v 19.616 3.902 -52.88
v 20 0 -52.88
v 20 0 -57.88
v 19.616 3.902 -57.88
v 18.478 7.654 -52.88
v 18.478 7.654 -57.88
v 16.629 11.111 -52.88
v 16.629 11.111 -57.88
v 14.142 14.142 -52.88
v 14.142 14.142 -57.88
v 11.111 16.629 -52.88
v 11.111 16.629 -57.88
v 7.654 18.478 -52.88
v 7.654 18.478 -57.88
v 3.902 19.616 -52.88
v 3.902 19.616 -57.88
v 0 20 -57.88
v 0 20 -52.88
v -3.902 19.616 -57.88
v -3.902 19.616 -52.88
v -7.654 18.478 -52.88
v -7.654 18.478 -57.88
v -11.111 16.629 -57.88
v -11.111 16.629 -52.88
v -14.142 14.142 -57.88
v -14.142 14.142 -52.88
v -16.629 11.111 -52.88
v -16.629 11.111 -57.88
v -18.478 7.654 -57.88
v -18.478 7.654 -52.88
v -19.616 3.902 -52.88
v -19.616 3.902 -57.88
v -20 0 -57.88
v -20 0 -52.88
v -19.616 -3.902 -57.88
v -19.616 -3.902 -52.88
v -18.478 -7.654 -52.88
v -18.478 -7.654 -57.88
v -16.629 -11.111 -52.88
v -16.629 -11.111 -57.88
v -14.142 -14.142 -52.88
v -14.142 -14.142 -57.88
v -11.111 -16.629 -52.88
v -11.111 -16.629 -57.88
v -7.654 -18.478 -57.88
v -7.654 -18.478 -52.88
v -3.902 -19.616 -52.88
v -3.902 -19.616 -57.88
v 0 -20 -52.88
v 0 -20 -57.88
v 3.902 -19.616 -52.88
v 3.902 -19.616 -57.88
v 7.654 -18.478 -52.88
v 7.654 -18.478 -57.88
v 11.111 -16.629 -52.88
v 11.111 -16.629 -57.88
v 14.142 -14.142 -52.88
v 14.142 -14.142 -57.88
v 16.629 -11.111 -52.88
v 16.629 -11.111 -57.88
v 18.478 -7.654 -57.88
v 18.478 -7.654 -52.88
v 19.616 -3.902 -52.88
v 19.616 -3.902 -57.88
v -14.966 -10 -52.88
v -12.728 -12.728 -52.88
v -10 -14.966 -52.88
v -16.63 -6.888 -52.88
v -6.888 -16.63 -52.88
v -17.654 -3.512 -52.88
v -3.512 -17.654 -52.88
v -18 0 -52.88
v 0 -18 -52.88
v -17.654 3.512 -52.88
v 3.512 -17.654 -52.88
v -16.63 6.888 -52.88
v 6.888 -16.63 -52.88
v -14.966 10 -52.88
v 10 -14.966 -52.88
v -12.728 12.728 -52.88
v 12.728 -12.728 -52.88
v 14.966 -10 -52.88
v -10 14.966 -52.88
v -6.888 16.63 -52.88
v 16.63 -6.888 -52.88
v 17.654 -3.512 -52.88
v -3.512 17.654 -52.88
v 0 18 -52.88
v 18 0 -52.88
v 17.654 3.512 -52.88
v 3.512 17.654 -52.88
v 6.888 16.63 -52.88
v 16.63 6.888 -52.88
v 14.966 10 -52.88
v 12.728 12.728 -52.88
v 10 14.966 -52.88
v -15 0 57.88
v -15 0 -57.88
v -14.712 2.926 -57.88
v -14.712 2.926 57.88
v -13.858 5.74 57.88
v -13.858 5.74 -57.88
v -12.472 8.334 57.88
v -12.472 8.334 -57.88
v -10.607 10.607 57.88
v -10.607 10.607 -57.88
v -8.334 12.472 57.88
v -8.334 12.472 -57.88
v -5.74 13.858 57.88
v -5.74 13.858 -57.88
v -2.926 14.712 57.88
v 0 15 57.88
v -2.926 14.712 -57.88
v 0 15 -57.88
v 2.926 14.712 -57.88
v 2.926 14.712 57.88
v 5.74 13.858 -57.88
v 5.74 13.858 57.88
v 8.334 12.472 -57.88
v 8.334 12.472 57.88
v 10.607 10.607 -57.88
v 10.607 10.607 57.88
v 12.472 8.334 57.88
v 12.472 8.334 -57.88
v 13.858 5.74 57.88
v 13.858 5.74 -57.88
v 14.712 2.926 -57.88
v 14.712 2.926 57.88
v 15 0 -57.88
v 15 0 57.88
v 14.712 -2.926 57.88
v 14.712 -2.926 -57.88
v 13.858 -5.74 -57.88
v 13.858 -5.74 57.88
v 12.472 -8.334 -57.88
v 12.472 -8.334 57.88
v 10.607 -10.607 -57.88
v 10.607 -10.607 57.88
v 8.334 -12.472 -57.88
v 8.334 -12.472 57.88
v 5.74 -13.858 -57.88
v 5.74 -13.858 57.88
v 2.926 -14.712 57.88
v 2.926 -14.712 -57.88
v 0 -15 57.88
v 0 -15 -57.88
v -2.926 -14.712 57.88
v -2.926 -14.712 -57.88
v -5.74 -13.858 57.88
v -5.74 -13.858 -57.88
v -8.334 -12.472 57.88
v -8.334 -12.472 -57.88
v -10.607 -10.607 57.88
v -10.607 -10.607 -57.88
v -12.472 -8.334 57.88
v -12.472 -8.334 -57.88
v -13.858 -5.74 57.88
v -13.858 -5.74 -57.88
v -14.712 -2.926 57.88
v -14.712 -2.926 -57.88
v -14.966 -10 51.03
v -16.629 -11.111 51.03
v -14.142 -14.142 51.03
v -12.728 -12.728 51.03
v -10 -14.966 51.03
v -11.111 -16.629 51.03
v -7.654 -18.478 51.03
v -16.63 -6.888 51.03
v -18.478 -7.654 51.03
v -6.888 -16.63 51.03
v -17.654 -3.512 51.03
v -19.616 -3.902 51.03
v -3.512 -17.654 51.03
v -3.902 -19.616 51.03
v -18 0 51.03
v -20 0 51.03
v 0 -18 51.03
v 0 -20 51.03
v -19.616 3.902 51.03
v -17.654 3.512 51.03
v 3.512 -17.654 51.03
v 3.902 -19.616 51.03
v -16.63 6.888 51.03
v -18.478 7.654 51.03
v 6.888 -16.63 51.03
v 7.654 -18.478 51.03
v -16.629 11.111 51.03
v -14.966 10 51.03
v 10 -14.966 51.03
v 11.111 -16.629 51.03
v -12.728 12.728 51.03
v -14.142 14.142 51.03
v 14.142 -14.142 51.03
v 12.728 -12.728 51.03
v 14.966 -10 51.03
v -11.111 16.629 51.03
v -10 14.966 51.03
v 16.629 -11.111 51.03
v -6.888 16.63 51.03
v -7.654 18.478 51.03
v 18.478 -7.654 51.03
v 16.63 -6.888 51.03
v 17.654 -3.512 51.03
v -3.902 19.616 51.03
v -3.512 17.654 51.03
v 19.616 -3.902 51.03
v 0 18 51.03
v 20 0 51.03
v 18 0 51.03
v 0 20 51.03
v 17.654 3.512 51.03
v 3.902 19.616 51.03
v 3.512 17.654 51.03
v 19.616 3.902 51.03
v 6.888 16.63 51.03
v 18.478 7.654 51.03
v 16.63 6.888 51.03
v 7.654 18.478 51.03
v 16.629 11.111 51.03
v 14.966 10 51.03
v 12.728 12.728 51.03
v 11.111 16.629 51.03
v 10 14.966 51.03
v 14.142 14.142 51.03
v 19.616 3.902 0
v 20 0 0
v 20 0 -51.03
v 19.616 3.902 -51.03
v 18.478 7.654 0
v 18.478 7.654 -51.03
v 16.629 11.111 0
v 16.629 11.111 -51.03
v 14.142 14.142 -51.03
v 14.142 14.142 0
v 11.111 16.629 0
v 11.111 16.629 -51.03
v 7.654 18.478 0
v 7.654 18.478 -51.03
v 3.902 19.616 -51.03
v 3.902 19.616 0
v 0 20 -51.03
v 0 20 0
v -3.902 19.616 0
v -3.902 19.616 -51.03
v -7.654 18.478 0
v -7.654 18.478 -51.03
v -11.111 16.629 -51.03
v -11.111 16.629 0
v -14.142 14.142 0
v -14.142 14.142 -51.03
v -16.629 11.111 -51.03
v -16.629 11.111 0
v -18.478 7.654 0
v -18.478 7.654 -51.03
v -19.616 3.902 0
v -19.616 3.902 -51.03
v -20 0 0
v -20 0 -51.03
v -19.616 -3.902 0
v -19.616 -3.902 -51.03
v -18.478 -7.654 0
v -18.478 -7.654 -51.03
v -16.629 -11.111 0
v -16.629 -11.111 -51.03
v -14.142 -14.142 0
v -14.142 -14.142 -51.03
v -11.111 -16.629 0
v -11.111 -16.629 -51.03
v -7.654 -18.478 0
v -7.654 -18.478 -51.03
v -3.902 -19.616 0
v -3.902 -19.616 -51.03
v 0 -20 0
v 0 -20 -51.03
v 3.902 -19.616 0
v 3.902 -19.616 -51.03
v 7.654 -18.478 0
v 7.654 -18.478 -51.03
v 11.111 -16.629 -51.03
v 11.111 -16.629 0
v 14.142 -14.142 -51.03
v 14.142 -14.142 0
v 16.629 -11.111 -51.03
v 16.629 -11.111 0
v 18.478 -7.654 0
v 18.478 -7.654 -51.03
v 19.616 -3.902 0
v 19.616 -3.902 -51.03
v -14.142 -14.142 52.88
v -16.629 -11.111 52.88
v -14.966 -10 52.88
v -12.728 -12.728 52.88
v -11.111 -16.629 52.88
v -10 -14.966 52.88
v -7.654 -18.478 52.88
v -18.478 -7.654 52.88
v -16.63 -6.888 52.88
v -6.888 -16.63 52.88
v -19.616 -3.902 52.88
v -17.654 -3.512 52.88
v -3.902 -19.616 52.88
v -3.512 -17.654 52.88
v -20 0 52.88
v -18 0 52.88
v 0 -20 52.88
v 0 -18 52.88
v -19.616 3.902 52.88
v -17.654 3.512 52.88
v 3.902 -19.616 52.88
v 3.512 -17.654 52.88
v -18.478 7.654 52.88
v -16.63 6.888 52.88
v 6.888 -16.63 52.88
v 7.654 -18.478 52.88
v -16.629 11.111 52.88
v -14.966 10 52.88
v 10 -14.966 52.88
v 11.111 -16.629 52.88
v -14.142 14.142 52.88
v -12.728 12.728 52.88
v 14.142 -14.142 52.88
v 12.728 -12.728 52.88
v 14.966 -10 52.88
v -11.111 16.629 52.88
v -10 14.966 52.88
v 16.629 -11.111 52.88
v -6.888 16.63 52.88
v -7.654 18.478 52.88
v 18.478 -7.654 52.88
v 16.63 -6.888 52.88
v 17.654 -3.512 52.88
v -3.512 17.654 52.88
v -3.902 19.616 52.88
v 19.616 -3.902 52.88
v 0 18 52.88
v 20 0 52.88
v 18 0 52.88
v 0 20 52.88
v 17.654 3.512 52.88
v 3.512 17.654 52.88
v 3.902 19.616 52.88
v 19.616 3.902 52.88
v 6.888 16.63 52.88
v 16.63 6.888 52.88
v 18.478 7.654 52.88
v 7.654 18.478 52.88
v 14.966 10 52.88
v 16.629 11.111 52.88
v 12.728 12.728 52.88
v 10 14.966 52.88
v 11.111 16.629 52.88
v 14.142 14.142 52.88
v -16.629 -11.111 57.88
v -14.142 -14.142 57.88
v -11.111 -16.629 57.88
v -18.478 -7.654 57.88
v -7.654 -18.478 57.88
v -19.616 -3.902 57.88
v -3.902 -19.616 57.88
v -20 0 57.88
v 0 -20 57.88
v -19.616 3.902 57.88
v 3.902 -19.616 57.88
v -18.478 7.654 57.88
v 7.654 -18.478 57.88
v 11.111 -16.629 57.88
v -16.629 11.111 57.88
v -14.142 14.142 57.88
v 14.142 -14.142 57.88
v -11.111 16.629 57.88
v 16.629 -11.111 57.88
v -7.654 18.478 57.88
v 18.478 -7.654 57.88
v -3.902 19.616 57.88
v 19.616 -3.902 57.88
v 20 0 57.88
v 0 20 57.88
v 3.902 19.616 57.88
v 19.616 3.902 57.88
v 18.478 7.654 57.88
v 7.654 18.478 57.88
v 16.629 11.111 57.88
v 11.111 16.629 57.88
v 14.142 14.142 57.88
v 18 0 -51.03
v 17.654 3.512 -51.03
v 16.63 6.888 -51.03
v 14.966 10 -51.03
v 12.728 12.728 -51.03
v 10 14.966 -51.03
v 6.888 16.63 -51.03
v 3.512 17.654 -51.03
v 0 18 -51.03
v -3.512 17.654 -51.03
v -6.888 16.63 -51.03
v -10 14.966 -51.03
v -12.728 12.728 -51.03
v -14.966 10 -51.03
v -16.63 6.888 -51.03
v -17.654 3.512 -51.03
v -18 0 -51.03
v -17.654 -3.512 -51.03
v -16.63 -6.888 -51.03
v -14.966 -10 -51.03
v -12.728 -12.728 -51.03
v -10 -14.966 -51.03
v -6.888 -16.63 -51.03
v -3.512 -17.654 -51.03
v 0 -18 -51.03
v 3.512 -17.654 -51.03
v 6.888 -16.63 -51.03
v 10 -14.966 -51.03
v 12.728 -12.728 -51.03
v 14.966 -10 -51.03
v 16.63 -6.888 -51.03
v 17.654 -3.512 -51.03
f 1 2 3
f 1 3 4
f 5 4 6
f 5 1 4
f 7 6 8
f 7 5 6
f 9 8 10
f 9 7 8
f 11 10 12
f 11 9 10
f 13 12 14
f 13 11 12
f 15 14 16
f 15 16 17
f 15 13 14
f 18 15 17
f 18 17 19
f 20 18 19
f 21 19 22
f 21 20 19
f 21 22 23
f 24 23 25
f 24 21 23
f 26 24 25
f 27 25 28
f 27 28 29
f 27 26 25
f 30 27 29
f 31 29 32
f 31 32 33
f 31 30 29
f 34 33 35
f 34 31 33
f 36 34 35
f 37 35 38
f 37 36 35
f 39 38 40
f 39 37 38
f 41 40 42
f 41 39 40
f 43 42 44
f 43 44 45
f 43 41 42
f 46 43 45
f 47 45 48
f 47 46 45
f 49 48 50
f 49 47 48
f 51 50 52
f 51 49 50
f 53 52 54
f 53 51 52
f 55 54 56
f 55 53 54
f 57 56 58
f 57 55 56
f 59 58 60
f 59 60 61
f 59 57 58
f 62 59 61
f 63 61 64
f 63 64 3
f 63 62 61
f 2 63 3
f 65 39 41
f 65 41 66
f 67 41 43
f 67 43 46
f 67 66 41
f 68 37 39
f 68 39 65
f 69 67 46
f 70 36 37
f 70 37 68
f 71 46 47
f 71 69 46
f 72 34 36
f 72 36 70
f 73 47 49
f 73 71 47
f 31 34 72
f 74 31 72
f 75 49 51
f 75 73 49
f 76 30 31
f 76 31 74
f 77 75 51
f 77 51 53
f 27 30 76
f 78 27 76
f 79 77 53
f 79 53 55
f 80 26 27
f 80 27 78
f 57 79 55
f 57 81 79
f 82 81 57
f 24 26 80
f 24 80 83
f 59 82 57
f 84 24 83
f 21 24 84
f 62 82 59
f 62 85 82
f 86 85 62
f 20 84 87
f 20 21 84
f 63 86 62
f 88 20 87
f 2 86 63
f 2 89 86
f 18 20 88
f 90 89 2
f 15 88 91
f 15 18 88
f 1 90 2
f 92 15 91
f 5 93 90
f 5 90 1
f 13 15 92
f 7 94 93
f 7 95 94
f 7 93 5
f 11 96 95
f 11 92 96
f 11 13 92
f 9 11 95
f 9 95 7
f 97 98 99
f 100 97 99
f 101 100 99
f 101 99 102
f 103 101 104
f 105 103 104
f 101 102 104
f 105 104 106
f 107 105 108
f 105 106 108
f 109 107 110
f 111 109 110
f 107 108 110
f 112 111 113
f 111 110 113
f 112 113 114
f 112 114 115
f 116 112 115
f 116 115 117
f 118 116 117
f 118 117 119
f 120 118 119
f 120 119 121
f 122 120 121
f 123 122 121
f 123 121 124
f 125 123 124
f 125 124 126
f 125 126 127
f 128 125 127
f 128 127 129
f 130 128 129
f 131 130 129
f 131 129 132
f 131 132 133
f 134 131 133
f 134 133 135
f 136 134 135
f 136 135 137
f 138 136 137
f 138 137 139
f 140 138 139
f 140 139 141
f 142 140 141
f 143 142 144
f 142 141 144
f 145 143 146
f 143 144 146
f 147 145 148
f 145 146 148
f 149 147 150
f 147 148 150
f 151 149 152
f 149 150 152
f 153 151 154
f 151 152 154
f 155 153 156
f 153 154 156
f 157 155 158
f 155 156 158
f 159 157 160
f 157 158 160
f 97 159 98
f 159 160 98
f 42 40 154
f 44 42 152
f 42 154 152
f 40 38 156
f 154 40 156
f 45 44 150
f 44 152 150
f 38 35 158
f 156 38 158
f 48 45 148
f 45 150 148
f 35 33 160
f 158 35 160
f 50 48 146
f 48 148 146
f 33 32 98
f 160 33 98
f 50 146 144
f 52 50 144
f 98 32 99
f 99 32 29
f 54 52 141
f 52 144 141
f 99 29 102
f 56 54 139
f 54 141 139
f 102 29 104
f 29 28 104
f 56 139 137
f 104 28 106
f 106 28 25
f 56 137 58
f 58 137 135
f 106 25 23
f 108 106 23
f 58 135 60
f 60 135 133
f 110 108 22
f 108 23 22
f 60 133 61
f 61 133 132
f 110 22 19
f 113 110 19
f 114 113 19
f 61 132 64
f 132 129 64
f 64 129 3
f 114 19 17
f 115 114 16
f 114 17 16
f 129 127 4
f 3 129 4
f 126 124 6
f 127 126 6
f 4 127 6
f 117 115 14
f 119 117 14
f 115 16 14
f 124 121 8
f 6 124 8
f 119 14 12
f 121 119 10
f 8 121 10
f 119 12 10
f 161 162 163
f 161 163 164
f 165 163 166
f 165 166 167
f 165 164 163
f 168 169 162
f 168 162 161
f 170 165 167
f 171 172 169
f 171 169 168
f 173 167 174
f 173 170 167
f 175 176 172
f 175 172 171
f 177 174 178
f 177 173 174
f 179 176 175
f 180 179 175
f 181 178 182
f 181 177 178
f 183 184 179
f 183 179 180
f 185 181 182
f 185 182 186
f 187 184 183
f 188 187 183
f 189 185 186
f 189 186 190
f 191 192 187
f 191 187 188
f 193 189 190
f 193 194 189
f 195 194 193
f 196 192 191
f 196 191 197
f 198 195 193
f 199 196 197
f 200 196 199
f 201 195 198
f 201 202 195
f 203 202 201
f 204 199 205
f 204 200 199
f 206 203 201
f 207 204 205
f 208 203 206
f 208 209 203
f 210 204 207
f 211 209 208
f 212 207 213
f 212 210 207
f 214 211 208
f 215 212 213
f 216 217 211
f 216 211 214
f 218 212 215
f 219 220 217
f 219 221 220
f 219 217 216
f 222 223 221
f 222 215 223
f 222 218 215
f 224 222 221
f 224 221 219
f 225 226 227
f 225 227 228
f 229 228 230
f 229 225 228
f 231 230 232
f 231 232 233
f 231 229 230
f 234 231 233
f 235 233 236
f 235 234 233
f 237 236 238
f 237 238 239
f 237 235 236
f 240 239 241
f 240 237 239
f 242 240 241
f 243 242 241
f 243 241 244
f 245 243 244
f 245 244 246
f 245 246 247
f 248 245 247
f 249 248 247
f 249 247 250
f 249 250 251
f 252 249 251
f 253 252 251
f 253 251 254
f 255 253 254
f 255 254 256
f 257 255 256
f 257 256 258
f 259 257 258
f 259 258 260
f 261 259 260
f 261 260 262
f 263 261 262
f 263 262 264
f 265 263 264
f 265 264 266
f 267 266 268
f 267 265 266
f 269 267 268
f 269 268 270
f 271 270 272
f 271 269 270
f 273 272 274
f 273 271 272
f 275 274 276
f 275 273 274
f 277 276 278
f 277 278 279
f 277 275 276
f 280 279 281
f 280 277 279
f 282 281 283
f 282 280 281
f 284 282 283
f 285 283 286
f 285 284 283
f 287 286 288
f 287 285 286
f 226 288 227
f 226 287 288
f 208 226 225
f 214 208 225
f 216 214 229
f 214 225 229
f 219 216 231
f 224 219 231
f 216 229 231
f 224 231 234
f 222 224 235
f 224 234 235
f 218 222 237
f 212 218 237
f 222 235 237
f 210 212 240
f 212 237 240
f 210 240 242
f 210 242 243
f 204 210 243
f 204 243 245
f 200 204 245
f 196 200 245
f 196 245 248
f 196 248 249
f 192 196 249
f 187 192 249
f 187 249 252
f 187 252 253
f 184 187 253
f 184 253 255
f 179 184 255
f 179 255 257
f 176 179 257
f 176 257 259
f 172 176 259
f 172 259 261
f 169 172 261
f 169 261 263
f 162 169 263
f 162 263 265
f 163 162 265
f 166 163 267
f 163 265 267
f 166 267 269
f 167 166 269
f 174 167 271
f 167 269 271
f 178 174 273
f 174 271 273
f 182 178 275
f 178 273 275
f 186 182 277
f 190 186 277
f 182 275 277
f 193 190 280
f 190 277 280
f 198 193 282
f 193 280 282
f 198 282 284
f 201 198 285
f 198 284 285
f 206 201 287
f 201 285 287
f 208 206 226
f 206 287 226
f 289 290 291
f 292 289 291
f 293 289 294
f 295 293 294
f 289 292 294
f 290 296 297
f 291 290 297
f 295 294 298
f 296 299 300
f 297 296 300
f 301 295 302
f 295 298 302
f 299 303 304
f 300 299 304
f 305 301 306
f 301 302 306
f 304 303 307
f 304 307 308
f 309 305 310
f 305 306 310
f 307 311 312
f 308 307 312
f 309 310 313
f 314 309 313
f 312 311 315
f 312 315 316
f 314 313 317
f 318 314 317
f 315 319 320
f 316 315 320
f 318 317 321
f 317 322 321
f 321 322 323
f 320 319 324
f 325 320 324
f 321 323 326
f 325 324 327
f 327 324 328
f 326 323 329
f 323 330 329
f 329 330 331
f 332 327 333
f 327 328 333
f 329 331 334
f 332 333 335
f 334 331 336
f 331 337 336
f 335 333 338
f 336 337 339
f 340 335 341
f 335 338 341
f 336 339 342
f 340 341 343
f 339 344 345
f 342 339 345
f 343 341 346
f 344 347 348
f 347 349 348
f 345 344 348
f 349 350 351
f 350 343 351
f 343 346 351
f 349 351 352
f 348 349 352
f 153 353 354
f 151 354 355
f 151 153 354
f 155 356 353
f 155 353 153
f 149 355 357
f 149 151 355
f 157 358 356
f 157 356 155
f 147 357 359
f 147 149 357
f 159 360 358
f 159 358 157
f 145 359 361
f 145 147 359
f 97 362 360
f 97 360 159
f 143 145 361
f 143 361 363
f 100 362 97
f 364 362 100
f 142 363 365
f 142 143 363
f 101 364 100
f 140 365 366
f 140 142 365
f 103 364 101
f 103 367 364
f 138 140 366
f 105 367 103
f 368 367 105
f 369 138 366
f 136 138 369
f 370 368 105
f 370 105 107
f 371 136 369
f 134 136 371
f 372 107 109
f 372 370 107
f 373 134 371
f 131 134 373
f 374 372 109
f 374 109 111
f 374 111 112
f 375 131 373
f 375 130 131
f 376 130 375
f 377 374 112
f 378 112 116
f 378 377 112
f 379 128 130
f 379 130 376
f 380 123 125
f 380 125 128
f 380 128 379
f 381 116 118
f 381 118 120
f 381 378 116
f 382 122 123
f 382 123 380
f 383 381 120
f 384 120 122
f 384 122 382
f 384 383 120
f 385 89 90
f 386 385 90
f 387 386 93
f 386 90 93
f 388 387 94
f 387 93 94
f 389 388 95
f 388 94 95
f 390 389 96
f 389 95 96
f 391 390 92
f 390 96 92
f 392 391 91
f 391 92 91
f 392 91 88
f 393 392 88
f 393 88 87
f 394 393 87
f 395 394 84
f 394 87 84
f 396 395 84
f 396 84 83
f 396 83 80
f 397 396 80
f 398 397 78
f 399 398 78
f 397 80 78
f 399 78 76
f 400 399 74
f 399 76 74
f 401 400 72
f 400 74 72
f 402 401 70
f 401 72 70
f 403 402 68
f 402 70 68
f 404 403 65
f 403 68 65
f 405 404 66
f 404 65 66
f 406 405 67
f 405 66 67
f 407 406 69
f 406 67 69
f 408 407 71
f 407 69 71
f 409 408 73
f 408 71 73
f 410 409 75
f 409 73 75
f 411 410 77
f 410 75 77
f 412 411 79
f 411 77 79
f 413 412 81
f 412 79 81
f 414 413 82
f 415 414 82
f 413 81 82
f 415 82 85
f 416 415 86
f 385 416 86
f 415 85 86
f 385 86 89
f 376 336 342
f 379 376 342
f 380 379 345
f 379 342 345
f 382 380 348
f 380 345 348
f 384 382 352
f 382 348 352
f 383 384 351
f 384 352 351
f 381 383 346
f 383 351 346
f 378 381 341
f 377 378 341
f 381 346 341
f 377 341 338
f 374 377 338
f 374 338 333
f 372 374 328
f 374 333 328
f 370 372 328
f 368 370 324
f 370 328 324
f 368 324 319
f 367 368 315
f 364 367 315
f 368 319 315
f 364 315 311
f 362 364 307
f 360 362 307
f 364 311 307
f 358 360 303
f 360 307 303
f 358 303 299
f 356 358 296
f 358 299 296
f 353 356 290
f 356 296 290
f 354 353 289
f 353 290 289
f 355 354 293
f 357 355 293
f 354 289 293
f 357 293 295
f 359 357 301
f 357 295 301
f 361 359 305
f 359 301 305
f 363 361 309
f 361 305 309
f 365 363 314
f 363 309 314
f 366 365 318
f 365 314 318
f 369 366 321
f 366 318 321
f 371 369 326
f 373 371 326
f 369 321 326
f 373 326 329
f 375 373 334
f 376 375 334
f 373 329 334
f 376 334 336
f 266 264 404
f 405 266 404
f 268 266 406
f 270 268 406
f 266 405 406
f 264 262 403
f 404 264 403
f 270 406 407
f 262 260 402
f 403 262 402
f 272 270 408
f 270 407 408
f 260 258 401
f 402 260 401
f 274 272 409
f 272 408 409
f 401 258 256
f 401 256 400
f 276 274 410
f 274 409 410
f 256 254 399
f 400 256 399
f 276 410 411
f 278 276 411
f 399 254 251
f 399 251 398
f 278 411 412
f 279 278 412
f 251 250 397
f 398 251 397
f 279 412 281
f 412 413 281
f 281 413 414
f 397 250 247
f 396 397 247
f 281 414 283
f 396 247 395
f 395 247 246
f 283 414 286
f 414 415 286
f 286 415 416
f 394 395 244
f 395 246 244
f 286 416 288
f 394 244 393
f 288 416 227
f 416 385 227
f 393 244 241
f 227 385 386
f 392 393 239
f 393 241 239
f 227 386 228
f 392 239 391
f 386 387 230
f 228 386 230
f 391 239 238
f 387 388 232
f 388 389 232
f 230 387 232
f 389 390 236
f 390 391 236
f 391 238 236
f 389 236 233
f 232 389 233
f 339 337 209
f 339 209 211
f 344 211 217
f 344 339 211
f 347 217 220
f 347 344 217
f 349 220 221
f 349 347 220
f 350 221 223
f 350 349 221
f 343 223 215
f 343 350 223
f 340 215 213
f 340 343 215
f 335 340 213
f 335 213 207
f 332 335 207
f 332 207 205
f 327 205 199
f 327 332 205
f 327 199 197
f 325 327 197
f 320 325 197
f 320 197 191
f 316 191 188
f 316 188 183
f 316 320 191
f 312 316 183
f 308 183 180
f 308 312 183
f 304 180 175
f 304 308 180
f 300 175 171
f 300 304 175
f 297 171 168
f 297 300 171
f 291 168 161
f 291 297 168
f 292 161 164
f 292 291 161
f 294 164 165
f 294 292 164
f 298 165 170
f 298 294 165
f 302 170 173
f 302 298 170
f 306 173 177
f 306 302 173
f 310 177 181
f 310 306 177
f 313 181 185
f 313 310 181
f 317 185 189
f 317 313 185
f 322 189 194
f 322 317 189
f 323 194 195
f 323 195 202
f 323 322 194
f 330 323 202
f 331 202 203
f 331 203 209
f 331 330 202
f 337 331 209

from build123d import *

# Parameters (mm, degrees)
SKETCH1_R               = 20
BOSS_EXTRUDE1_DEPTH     = 52.8796
SKETCH2_R               = 20
SKETCH2_R_2             = 18
CUT_EXTRUDE2_DEPTH      = 1.85
SKETCH6_R               = 20
BOSS_EXTRUDE2_DEPTH     = 5
SKETCH7_R               = 15
CUT_EXTRUDE3_DEPTH      = 1
CUT_EXTRUDE3_DEPTH_BACK = 116.7592


with BuildPart() as part:
    # Sketch1 → Boss-Extrude1 (new body)
    with BuildSketch(Plane.XY):
        Circle(SKETCH1_R)
    extrude(amount=BOSS_EXTRUDE1_DEPTH)

    # Sketch2 → Cut-Extrude2 (cut)
    with BuildSketch(Plane.XY.offset(52.8796)):
        Circle(SKETCH2_R)
        Circle(SKETCH2_R_2, mode=Mode.SUBTRACT)
    extrude(amount=-CUT_EXTRUDE2_DEPTH, mode=Mode.SUBTRACT)

    # Sketch6 → Boss-Extrude2 (add)
    with BuildSketch(Plane.XY.offset(52.8796)):
        Circle(SKETCH6_R)
    extrude(amount=BOSS_EXTRUDE2_DEPTH)

    # Mirror2: part across plane


with BuildPart() as part_1:
    add(part.part)
    add(part.part.mirror(Plane.XY))

    # Sketch7 → Cut-Extrude3 (cut, two sides)
    with BuildSketch(Plane(origin=(0, 0, -57.8796), x_dir=(-1, 0, 0), z_dir=(0, 0, -1))) as cut_extrude3_sk:
        Circle(SKETCH7_R)
    extrude(amount=CUT_EXTRUDE3_DEPTH, mode=Mode.SUBTRACT)
    extrude(cut_extrude3_sk.sketch, amount=-CUT_EXTRUDE3_DEPTH_BACK, mode=Mode.SUBTRACT)


solid = part_1.part
